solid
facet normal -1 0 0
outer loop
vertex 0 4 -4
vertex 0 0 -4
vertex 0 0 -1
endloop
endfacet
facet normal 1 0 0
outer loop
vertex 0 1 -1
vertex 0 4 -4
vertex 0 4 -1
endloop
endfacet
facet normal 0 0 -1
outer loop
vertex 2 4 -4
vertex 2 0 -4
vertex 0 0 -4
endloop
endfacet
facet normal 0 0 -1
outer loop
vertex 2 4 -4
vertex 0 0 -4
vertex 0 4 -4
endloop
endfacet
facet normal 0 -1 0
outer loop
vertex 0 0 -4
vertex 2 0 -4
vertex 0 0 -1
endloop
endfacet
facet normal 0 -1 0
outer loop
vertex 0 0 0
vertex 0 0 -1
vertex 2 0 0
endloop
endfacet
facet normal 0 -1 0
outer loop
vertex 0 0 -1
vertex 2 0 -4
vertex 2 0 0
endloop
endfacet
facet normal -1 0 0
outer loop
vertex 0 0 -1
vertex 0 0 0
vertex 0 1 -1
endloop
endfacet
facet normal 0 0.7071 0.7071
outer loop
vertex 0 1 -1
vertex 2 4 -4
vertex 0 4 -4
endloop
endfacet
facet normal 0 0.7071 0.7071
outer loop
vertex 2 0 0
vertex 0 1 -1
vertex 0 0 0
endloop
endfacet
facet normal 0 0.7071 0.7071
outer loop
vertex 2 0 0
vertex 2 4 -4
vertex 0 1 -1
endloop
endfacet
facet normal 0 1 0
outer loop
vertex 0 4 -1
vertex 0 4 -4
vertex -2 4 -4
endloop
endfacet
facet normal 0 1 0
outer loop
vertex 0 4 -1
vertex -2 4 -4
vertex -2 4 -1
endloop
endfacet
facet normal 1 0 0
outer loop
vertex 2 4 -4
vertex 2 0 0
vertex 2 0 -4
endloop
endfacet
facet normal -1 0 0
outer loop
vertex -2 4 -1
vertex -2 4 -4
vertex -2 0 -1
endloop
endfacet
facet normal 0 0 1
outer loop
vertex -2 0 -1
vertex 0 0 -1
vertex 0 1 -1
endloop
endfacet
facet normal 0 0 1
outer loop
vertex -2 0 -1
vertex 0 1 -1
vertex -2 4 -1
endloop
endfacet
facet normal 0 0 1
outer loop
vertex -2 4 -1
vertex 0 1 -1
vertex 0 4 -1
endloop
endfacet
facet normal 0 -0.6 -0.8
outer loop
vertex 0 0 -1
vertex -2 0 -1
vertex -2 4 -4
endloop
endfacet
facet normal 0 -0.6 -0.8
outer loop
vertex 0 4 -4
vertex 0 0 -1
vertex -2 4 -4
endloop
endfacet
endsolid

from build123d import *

# Parameters (mm, degrees)
SKETCH1_W           = 4
SKETCH1_H           = 4
BOSS_EXTRUDE1_DEPTH = 2
SKETCH2_W           = 3
SKETCH2_H           = 4
BOSS_EXTRUDE2_DEPTH = 2
CUT_EXTRUDE1_DEPTH  = 2
CUT_EXTRUDE2_DEPTH  = 2


with BuildPart() as part:
    # Sketch1 → Boss-Extrude1 (new body)
    with BuildSketch(Plane(origin=(0, 0, 0), x_dir=(0, 0, -1), z_dir=(1, 0, 0))):
        with Locations((2, 2)):
            Rectangle(SKETCH1_W, SKETCH1_H)
    extrude(amount=BOSS_EXTRUDE1_DEPTH)

    # Sketch2 → Boss-Extrude2 (add)
    with BuildSketch(Plane.ZY):
        with Locations((-2.5, 2)):
            Rectangle(SKETCH2_W, SKETCH2_H)
    extrude(amount=BOSS_EXTRUDE2_DEPTH)

    # Sketch3 → Cut-Extrude1 (cut)
    with BuildSketch(Plane(origin=(2, 0, 0), x_dir=(0, 0, -1), z_dir=(1, 0, 0))):
        Polygon((4, 4), (0, 0), (0, 4), align=None)
    extrude(amount=-CUT_EXTRUDE1_DEPTH, mode=Mode.SUBTRACT)

    # Sketch4 → Cut-Extrude2 (cut)
    with BuildSketch(Plane.ZY.offset(2)):
        Polygon((-1, 0), (-4, 4), (-4, 0), align=None)
    extrude(amount=-CUT_EXTRUDE2_DEPTH, mode=Mode.SUBTRACT)


solid = part.part
